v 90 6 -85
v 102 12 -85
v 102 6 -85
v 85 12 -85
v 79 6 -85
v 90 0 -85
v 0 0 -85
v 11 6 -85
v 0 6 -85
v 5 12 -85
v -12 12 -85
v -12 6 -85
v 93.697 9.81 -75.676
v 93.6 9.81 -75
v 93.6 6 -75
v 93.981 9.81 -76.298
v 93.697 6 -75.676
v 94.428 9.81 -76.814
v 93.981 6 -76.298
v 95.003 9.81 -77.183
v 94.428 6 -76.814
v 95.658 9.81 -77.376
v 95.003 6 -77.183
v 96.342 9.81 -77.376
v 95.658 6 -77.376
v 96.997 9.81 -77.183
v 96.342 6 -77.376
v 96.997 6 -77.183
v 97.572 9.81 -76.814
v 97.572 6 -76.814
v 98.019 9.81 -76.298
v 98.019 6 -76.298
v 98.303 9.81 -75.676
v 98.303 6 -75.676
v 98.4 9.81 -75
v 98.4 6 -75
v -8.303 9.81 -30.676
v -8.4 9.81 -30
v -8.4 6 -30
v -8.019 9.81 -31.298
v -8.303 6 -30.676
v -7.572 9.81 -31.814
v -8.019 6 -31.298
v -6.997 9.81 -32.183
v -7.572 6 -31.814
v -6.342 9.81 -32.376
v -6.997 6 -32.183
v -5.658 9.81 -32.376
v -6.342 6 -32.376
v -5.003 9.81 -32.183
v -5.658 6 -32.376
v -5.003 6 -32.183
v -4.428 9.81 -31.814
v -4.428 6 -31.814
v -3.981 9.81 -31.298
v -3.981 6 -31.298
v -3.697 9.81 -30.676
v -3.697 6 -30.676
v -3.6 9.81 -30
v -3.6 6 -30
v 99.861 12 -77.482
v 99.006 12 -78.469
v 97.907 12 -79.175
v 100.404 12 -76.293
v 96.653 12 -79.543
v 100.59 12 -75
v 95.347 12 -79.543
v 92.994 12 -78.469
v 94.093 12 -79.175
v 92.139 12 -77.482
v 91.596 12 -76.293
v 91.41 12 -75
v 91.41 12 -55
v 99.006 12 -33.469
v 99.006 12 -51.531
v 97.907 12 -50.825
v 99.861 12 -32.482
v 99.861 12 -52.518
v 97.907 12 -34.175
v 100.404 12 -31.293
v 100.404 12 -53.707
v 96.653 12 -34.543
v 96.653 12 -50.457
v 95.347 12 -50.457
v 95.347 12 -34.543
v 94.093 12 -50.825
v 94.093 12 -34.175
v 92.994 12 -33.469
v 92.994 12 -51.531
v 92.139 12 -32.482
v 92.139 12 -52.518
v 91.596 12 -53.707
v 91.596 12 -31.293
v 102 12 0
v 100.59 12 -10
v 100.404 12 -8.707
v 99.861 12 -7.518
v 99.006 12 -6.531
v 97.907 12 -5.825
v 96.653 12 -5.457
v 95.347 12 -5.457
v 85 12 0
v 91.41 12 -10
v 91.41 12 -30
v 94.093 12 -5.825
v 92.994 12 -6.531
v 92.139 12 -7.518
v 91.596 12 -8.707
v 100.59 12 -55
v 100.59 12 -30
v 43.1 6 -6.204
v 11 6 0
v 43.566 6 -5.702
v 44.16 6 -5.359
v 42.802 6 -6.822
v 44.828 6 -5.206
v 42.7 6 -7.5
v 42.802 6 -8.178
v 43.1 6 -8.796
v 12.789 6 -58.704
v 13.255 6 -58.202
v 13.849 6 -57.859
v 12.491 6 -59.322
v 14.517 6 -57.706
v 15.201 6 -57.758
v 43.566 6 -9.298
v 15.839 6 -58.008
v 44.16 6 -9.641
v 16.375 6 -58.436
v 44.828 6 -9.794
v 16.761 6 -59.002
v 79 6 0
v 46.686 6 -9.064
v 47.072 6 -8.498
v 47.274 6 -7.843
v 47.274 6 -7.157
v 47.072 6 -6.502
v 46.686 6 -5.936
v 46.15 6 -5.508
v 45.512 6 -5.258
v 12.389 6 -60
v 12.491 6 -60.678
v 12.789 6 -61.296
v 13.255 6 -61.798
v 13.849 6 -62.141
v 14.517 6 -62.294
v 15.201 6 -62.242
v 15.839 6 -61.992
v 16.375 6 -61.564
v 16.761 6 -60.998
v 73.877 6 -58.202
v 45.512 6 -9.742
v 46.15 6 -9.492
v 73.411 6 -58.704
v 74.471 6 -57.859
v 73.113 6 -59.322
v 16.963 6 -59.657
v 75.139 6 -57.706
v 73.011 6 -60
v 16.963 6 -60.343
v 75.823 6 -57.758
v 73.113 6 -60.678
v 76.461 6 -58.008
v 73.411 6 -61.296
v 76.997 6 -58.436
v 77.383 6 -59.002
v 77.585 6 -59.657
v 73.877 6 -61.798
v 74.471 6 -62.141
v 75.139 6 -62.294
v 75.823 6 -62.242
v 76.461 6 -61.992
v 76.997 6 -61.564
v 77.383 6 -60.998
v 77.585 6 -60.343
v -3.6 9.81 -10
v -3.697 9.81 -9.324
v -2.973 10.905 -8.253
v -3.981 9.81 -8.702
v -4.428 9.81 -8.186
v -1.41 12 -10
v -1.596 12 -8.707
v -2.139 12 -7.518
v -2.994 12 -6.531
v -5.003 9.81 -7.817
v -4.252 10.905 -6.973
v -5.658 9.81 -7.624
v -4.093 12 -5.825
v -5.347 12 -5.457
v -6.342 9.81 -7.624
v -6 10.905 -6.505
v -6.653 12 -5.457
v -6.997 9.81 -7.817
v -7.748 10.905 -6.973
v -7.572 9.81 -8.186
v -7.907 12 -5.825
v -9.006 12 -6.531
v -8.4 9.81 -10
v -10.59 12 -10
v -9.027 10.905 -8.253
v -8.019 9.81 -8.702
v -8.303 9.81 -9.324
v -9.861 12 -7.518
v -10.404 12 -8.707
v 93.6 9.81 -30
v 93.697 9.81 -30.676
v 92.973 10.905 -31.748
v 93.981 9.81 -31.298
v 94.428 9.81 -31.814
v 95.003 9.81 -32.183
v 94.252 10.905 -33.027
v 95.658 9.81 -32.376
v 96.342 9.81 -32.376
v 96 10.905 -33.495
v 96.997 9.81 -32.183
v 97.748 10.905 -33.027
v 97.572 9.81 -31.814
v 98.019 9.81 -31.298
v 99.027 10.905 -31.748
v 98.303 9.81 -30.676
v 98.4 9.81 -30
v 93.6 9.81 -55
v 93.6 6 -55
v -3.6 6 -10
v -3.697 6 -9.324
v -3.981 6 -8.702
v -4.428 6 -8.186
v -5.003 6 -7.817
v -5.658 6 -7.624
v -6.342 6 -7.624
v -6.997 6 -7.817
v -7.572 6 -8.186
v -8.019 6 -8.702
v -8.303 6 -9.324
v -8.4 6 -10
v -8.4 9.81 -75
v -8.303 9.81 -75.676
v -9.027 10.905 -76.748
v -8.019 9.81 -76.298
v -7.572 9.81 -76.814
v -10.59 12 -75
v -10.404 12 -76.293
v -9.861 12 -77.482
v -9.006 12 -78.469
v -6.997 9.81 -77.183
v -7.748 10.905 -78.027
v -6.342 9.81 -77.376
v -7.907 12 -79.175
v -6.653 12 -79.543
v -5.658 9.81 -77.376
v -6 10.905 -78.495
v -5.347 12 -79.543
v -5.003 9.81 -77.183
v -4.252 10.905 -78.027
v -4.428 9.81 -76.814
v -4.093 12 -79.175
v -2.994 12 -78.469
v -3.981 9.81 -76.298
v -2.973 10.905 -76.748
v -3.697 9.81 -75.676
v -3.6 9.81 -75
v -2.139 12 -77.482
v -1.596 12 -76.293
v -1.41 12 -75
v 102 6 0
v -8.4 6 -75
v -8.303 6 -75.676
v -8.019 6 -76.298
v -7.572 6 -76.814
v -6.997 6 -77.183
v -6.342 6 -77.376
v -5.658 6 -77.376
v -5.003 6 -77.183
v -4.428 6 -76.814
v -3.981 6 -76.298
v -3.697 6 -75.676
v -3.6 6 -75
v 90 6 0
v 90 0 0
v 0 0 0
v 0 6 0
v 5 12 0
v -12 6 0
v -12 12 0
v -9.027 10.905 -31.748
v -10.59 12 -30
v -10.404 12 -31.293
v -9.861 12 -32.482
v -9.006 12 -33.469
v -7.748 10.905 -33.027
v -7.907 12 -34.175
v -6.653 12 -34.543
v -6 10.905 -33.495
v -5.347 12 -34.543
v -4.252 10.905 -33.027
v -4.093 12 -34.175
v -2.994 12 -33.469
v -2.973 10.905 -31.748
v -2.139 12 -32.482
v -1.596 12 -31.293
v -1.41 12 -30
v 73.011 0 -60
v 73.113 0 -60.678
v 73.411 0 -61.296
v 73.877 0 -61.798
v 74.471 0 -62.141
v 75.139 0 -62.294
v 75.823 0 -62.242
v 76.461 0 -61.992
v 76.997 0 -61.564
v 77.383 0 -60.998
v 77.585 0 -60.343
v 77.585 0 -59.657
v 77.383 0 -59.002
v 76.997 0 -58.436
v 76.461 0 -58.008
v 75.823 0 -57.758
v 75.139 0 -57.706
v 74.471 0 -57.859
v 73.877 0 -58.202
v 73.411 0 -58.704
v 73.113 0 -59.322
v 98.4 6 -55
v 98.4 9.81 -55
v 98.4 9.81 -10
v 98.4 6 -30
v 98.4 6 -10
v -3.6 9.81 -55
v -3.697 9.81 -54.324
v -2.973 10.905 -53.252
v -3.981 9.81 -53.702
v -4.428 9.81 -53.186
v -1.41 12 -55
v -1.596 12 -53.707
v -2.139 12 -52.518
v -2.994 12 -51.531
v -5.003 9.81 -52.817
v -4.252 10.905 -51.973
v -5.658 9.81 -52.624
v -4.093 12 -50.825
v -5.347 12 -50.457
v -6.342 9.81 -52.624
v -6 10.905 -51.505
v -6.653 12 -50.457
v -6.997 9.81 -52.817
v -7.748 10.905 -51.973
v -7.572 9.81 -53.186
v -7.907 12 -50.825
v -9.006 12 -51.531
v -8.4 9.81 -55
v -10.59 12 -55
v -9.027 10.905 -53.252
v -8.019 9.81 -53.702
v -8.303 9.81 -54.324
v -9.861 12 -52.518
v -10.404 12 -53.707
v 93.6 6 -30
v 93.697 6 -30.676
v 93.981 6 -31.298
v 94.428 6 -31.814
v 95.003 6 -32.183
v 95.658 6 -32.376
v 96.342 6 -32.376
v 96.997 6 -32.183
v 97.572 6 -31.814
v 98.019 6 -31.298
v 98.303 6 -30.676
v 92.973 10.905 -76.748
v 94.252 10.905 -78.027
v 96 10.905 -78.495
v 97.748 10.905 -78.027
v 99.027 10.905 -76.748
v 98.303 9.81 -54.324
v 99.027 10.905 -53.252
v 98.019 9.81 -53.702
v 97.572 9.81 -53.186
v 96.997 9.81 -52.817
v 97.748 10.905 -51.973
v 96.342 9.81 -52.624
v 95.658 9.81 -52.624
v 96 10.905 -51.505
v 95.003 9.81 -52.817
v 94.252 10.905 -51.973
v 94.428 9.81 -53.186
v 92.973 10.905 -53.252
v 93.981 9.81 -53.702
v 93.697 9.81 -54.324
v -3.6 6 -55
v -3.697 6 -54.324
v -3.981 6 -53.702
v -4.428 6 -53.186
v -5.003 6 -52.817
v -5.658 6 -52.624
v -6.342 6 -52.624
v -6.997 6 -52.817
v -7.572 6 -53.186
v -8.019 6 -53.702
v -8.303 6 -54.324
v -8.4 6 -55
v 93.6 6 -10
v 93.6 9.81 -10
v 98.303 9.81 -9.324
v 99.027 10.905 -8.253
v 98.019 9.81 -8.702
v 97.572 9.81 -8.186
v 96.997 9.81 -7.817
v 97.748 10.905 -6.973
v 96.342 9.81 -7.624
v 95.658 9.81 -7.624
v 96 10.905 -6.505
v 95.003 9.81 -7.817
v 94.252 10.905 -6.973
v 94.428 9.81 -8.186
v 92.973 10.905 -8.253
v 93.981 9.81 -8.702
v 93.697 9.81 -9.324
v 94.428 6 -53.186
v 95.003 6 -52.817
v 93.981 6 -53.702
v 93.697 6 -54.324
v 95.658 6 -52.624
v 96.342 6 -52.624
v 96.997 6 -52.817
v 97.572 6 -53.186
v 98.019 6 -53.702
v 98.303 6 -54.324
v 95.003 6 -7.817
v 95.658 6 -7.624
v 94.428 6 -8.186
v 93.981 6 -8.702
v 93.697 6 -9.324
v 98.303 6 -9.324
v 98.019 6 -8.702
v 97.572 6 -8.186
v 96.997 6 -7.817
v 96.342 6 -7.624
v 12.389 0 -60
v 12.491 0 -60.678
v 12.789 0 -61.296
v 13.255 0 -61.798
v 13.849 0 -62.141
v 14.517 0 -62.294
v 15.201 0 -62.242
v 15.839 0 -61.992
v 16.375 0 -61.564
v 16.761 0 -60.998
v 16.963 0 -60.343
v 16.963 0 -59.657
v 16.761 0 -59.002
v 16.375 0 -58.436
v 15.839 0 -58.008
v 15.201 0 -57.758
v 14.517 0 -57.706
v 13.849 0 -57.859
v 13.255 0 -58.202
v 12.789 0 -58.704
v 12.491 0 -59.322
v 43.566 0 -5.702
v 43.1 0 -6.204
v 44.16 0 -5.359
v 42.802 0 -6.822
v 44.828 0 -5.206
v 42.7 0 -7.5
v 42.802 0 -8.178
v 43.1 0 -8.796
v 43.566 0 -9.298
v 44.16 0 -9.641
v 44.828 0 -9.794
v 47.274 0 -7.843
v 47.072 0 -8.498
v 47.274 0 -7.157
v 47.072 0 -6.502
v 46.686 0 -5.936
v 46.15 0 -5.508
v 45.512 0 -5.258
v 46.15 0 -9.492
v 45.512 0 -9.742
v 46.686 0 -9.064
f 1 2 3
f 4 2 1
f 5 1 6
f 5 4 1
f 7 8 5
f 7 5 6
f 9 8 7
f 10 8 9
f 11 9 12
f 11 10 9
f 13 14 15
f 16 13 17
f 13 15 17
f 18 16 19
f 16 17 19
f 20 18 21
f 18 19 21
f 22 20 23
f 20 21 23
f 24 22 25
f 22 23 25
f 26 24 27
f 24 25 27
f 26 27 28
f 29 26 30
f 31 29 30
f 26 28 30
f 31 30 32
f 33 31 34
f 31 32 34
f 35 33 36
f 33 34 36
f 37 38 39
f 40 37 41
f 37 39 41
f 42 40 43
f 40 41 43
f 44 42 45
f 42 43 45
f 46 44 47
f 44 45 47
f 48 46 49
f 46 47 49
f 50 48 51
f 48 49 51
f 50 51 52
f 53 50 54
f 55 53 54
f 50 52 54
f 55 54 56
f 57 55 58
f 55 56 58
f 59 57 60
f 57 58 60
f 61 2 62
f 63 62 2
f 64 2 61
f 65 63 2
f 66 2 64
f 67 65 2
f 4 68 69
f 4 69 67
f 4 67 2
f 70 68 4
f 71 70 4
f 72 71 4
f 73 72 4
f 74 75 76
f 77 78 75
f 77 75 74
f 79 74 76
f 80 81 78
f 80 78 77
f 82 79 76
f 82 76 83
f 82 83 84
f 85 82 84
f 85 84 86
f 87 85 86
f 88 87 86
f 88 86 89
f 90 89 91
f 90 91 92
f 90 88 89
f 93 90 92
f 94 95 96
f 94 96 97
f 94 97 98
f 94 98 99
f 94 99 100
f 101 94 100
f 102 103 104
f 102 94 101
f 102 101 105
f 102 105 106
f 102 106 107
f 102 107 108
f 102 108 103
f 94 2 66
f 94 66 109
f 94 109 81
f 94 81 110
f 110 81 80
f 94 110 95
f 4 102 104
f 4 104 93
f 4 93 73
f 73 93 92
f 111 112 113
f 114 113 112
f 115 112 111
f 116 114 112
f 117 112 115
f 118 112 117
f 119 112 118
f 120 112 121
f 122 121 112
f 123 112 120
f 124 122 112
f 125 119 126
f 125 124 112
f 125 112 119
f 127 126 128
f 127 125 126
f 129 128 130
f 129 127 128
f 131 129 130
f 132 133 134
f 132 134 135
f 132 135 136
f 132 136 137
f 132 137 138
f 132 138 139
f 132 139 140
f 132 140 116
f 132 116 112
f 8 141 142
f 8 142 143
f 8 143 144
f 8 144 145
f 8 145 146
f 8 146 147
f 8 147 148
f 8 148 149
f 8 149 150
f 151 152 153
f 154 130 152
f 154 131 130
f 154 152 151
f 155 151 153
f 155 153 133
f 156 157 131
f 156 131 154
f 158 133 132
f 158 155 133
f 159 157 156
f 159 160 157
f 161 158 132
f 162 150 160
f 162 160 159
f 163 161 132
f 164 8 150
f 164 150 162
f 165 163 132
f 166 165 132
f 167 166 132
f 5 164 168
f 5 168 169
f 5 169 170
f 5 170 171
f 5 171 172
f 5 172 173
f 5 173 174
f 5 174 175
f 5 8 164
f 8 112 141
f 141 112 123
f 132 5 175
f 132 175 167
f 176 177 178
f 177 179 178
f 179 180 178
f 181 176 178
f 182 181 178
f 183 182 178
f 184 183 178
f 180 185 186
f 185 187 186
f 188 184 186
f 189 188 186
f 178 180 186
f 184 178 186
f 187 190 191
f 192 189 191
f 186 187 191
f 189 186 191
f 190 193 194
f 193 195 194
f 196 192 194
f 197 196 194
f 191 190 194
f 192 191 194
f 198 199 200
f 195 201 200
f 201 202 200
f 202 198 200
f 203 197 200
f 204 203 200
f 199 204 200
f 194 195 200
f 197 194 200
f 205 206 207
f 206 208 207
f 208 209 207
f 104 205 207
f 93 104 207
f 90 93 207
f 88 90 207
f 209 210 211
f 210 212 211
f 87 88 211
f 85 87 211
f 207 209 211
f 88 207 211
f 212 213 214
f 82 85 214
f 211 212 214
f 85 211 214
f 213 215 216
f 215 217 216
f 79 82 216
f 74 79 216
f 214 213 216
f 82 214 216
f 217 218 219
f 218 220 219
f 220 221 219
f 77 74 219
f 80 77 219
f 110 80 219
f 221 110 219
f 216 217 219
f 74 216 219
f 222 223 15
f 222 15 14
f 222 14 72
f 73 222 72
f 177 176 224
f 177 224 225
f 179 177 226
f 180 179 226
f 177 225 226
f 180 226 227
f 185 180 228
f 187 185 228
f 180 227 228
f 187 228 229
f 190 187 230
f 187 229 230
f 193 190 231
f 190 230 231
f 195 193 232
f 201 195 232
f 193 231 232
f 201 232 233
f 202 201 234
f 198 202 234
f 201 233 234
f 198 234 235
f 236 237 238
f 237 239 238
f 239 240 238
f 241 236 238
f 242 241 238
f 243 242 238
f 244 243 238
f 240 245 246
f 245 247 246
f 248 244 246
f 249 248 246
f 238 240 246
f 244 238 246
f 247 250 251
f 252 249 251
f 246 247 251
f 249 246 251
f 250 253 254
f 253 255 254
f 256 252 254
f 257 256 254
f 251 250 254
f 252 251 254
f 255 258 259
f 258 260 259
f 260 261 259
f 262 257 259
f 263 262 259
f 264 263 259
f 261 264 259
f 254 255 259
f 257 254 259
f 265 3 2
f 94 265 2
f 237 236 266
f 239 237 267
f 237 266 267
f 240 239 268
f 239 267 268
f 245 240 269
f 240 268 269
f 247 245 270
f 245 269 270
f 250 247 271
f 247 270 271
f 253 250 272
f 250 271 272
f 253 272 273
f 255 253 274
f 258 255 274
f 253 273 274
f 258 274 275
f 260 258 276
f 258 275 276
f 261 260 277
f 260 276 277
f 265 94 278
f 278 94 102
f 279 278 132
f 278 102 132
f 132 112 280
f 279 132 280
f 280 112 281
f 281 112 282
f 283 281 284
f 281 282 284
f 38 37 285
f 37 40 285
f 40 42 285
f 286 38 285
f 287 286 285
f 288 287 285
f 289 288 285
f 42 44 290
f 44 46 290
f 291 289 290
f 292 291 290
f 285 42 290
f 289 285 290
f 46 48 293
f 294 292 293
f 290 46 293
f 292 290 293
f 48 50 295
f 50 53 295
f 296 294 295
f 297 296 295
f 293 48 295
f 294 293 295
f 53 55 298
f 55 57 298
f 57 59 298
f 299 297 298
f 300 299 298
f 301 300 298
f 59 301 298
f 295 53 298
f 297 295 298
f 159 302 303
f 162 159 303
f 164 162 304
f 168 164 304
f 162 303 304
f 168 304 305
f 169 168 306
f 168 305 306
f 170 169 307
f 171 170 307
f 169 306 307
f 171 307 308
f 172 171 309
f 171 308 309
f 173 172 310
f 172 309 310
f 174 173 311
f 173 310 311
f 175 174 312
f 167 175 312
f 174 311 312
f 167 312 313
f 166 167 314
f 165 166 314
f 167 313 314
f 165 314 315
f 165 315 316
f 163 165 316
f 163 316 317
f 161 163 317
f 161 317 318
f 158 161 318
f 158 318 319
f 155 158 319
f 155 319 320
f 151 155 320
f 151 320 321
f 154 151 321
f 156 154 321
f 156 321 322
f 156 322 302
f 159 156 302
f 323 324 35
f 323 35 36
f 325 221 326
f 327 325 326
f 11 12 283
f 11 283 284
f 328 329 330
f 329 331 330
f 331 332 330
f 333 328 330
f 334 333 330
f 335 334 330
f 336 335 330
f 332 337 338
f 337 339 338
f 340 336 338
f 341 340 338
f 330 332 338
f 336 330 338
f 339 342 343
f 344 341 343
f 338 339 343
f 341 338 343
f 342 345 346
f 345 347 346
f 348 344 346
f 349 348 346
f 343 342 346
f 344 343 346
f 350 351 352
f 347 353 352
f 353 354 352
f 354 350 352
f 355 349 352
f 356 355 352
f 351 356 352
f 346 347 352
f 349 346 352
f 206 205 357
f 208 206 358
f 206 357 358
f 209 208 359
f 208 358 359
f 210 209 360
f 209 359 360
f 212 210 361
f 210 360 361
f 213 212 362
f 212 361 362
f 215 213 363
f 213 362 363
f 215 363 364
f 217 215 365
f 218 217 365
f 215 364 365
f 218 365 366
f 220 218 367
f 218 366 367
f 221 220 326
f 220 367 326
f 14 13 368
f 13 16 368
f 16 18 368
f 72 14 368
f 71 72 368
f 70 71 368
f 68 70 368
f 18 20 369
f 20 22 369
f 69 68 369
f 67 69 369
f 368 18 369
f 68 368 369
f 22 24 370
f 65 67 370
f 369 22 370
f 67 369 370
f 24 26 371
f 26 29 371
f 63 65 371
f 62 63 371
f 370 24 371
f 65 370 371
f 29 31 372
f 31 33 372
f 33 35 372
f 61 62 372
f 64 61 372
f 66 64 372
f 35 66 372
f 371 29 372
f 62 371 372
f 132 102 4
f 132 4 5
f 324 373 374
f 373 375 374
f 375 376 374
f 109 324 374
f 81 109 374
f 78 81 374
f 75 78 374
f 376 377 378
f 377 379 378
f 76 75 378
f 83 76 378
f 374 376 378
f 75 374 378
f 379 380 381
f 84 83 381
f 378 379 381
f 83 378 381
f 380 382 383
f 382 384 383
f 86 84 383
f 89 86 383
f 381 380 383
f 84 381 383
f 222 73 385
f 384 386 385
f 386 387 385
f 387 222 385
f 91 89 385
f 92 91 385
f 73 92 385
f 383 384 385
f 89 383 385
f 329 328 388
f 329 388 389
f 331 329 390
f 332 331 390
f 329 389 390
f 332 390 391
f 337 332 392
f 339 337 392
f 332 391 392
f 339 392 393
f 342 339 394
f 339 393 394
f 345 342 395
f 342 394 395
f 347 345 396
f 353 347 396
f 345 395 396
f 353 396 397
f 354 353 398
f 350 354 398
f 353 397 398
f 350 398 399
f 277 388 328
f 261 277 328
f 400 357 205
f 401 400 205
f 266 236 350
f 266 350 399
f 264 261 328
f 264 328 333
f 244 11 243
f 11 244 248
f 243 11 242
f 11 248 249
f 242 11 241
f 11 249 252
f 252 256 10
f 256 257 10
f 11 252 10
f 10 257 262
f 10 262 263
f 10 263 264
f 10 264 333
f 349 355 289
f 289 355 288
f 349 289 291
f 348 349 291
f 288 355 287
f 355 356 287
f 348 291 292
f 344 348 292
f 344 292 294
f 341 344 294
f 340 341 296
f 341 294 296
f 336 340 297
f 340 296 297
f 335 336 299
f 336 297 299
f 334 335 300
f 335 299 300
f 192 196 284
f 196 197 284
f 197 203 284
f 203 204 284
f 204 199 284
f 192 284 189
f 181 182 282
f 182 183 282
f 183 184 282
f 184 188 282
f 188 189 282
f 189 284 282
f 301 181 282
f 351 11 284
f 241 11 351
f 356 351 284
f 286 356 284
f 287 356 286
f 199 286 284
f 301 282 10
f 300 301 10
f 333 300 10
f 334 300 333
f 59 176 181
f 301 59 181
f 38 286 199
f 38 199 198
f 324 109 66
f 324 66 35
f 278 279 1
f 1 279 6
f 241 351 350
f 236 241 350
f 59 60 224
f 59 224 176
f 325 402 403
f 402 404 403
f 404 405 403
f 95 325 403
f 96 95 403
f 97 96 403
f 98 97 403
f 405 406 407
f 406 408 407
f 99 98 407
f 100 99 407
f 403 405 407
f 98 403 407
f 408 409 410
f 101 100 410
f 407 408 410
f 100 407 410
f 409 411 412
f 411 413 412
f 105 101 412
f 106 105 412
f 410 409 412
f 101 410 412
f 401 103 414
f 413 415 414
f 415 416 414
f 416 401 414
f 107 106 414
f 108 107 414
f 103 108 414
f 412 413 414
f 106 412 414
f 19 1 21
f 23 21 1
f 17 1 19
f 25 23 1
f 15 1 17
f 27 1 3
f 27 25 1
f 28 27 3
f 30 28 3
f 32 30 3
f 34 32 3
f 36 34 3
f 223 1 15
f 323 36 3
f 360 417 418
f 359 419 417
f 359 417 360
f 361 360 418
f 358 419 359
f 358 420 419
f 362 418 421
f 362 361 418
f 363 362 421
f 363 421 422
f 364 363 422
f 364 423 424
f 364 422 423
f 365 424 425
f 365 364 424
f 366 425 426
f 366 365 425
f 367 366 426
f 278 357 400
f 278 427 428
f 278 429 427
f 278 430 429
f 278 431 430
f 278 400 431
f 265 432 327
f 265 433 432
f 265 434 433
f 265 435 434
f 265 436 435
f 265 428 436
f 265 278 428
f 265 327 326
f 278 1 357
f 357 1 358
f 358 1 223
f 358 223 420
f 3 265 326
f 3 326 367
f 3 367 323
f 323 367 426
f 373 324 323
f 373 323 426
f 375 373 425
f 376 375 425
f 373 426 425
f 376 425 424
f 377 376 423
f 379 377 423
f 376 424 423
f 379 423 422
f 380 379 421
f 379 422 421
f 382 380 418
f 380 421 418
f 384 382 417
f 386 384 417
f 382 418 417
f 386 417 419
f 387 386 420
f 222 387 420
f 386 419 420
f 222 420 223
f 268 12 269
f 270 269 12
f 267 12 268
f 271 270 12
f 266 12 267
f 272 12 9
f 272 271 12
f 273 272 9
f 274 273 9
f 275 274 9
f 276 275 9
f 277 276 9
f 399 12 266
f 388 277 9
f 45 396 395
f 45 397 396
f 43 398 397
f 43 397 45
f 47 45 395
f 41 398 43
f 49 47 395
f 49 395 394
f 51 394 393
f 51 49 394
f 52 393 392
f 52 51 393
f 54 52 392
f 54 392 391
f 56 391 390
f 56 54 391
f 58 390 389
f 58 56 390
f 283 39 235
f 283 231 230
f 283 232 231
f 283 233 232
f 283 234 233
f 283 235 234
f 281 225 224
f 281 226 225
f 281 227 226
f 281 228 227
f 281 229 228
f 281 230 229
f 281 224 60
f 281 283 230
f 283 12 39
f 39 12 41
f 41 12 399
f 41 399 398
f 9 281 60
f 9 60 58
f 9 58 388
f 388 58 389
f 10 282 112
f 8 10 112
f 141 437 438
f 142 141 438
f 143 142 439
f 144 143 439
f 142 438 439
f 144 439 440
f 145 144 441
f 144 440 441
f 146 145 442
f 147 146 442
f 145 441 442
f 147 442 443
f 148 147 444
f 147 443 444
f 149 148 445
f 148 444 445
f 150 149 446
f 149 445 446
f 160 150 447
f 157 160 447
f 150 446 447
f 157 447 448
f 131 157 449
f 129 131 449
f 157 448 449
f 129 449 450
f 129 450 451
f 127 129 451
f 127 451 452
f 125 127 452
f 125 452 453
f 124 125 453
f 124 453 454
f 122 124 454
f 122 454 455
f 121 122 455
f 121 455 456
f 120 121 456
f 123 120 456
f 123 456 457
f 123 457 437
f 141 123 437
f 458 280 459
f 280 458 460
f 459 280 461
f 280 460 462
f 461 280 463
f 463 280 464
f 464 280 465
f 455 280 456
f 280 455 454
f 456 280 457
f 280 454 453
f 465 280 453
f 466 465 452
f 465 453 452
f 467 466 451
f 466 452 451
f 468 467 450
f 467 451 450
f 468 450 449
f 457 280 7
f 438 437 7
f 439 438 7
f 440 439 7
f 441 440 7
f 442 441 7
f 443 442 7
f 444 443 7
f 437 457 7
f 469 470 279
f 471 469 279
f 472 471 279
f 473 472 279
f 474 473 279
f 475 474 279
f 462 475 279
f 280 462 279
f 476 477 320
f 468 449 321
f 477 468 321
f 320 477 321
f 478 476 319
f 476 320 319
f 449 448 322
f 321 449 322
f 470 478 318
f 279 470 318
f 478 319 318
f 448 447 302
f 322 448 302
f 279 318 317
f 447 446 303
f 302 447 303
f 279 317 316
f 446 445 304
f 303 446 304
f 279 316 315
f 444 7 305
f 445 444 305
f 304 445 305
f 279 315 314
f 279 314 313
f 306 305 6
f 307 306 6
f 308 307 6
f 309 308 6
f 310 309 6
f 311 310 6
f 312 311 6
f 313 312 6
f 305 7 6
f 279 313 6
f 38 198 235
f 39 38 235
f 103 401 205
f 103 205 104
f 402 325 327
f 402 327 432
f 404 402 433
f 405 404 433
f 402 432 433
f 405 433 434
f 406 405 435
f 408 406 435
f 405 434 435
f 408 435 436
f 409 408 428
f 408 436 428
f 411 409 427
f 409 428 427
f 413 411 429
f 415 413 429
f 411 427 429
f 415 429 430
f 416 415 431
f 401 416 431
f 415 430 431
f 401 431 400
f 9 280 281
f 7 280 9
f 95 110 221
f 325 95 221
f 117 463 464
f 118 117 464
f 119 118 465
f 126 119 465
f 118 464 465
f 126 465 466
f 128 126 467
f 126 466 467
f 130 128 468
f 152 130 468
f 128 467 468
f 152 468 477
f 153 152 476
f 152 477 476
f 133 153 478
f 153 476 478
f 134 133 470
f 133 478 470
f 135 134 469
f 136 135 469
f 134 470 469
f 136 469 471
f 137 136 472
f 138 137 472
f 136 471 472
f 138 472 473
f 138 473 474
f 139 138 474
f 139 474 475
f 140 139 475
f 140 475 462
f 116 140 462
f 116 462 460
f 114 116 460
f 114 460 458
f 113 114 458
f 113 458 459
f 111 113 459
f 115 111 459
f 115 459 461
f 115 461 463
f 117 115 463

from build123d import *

# Parameters (mm, degrees)
SKETCH1_W                                            = 90
SKETCH1_H                                            = 85
BOSS_EXTRUDE1_DEPTH                                  = 6
F_4_6_4_6_DIAMETER_HOLE1_D                           = 4.6
BOSS_EXTRUDE2_DEPTH                                  = 85
CSK_FOR_M4_HEX_SOCKET_COUNTERSUNK_HEAD_S_D           = 4.8
CSK_FOR_M4_HEX_SOCKET_COUNTERSUNK_HEAD_S_CSINK_D     = 9.18
CSK_FOR_M4_HEX_SOCKET_COUNTERSUNK_HEAD_S_CSINK_ANGLE = 90
CUT_EXTRUDE1_DEPTH                                   = 20
CUT_EXTRUDE2_START                                   = -65
CUT_EXTRUDE2_DEPTH                                   = 20


with BuildPart() as part:
    # Sketch1 → Boss-Extrude1 (new body)
    with BuildSketch(Plane(origin=(0, 0, 0), x_dir=(1, 0, 0), z_dir=(0, 1, 0))):
        with Locations((45, 42.5)):
            Rectangle(SKETCH1_W, SKETCH1_H)
    extrude(amount=BOSS_EXTRUDE1_DEPTH)

    # Ø4.6 (4.6) Diameter Hole1 (through all)
    with Locations(Plane(origin=(0, 6, 0), x_dir=(1, 0, 0), z_dir=(0, 1, 0))):
        with Locations((75.310889132, 60), (45, 7.5), (14.689110868, 60)):
            Hole(F_4_6_4_6_DIAMETER_HOLE1_D / 2)

    # Sketch8 → Boss-Extrude2 (add)
    with BuildSketch(Plane.XY):
        Polygon((5, 12), (11, 6), (0, 6), (-12, 6), (-12, 12), align=None)
        Polygon((79, 6), (90, 6), (102, 6), (102, 12), (85, 12), align=None)
    extrude(amount=-BOSS_EXTRUDE2_DEPTH)

    # CSK for M4 Hex Socket Countersunk Head Screw1 (through all)
    with Locations(Plane(origin=(0, 12, 0), x_dir=(1, 0, 0), z_dir=(0, 1, 0))):
        with Locations((-6, 10), (-6, 75), (96, 75), (96, 10), (-6, 30), (-6, 55), (96, 55), (96, 30)):
            CounterSinkHole(CSK_FOR_M4_HEX_SOCKET_COUNTERSUNK_HEAD_S_D / 2, CSK_FOR_M4_HEX_SOCKET_COUNTERSUNK_HEAD_S_CSINK_D / 2, counter_sink_angle=CSK_FOR_M4_HEX_SOCKET_COUNTERSUNK_HEAD_S_CSINK_ANGLE)

    # Sketch16 → Cut-Extrude1 (cut)
    with BuildSketch(Plane(origin=(0, 0, -10), x_dir=(0, 1, 0), z_dir=(0, 0, 1))):
        Polygon((6, 8.4), (6, 3.6), (9.81, 3.6), (12, 1.41), (26, 24.59), (9.81, 8.4), align=None)
        Polygon((12, -91.41), (26, -114.59), (9.81, -98.4), (6, -98.4), (6, -93.6), (9.81, -93.6), align=None)
    extrude(amount=-CUT_EXTRUDE1_DEPTH, mode=Mode.SUBTRACT)

    # Sketch16<4> → Cut-Extrude2 (cut)
    with BuildSketch(Plane(origin=(0, 0, -10), x_dir=(0, 1, 0), z_dir=(0, 0, 1)).offset(CUT_EXTRUDE2_START)):
        Polygon((6, 8.4), (6, 3.6), (9.81, 3.6), (12, 1.41), (26, 24.59), (9.81, 8.4), align=None)
        Polygon((26, -114.59), (9.81, -98.4), (6, -98.4), (6, -93.6), (9.81, -93.6), (12, -91.41), align=None)
    extrude(amount=CUT_EXTRUDE2_DEPTH, mode=Mode.SUBTRACT)


solid = part.part
